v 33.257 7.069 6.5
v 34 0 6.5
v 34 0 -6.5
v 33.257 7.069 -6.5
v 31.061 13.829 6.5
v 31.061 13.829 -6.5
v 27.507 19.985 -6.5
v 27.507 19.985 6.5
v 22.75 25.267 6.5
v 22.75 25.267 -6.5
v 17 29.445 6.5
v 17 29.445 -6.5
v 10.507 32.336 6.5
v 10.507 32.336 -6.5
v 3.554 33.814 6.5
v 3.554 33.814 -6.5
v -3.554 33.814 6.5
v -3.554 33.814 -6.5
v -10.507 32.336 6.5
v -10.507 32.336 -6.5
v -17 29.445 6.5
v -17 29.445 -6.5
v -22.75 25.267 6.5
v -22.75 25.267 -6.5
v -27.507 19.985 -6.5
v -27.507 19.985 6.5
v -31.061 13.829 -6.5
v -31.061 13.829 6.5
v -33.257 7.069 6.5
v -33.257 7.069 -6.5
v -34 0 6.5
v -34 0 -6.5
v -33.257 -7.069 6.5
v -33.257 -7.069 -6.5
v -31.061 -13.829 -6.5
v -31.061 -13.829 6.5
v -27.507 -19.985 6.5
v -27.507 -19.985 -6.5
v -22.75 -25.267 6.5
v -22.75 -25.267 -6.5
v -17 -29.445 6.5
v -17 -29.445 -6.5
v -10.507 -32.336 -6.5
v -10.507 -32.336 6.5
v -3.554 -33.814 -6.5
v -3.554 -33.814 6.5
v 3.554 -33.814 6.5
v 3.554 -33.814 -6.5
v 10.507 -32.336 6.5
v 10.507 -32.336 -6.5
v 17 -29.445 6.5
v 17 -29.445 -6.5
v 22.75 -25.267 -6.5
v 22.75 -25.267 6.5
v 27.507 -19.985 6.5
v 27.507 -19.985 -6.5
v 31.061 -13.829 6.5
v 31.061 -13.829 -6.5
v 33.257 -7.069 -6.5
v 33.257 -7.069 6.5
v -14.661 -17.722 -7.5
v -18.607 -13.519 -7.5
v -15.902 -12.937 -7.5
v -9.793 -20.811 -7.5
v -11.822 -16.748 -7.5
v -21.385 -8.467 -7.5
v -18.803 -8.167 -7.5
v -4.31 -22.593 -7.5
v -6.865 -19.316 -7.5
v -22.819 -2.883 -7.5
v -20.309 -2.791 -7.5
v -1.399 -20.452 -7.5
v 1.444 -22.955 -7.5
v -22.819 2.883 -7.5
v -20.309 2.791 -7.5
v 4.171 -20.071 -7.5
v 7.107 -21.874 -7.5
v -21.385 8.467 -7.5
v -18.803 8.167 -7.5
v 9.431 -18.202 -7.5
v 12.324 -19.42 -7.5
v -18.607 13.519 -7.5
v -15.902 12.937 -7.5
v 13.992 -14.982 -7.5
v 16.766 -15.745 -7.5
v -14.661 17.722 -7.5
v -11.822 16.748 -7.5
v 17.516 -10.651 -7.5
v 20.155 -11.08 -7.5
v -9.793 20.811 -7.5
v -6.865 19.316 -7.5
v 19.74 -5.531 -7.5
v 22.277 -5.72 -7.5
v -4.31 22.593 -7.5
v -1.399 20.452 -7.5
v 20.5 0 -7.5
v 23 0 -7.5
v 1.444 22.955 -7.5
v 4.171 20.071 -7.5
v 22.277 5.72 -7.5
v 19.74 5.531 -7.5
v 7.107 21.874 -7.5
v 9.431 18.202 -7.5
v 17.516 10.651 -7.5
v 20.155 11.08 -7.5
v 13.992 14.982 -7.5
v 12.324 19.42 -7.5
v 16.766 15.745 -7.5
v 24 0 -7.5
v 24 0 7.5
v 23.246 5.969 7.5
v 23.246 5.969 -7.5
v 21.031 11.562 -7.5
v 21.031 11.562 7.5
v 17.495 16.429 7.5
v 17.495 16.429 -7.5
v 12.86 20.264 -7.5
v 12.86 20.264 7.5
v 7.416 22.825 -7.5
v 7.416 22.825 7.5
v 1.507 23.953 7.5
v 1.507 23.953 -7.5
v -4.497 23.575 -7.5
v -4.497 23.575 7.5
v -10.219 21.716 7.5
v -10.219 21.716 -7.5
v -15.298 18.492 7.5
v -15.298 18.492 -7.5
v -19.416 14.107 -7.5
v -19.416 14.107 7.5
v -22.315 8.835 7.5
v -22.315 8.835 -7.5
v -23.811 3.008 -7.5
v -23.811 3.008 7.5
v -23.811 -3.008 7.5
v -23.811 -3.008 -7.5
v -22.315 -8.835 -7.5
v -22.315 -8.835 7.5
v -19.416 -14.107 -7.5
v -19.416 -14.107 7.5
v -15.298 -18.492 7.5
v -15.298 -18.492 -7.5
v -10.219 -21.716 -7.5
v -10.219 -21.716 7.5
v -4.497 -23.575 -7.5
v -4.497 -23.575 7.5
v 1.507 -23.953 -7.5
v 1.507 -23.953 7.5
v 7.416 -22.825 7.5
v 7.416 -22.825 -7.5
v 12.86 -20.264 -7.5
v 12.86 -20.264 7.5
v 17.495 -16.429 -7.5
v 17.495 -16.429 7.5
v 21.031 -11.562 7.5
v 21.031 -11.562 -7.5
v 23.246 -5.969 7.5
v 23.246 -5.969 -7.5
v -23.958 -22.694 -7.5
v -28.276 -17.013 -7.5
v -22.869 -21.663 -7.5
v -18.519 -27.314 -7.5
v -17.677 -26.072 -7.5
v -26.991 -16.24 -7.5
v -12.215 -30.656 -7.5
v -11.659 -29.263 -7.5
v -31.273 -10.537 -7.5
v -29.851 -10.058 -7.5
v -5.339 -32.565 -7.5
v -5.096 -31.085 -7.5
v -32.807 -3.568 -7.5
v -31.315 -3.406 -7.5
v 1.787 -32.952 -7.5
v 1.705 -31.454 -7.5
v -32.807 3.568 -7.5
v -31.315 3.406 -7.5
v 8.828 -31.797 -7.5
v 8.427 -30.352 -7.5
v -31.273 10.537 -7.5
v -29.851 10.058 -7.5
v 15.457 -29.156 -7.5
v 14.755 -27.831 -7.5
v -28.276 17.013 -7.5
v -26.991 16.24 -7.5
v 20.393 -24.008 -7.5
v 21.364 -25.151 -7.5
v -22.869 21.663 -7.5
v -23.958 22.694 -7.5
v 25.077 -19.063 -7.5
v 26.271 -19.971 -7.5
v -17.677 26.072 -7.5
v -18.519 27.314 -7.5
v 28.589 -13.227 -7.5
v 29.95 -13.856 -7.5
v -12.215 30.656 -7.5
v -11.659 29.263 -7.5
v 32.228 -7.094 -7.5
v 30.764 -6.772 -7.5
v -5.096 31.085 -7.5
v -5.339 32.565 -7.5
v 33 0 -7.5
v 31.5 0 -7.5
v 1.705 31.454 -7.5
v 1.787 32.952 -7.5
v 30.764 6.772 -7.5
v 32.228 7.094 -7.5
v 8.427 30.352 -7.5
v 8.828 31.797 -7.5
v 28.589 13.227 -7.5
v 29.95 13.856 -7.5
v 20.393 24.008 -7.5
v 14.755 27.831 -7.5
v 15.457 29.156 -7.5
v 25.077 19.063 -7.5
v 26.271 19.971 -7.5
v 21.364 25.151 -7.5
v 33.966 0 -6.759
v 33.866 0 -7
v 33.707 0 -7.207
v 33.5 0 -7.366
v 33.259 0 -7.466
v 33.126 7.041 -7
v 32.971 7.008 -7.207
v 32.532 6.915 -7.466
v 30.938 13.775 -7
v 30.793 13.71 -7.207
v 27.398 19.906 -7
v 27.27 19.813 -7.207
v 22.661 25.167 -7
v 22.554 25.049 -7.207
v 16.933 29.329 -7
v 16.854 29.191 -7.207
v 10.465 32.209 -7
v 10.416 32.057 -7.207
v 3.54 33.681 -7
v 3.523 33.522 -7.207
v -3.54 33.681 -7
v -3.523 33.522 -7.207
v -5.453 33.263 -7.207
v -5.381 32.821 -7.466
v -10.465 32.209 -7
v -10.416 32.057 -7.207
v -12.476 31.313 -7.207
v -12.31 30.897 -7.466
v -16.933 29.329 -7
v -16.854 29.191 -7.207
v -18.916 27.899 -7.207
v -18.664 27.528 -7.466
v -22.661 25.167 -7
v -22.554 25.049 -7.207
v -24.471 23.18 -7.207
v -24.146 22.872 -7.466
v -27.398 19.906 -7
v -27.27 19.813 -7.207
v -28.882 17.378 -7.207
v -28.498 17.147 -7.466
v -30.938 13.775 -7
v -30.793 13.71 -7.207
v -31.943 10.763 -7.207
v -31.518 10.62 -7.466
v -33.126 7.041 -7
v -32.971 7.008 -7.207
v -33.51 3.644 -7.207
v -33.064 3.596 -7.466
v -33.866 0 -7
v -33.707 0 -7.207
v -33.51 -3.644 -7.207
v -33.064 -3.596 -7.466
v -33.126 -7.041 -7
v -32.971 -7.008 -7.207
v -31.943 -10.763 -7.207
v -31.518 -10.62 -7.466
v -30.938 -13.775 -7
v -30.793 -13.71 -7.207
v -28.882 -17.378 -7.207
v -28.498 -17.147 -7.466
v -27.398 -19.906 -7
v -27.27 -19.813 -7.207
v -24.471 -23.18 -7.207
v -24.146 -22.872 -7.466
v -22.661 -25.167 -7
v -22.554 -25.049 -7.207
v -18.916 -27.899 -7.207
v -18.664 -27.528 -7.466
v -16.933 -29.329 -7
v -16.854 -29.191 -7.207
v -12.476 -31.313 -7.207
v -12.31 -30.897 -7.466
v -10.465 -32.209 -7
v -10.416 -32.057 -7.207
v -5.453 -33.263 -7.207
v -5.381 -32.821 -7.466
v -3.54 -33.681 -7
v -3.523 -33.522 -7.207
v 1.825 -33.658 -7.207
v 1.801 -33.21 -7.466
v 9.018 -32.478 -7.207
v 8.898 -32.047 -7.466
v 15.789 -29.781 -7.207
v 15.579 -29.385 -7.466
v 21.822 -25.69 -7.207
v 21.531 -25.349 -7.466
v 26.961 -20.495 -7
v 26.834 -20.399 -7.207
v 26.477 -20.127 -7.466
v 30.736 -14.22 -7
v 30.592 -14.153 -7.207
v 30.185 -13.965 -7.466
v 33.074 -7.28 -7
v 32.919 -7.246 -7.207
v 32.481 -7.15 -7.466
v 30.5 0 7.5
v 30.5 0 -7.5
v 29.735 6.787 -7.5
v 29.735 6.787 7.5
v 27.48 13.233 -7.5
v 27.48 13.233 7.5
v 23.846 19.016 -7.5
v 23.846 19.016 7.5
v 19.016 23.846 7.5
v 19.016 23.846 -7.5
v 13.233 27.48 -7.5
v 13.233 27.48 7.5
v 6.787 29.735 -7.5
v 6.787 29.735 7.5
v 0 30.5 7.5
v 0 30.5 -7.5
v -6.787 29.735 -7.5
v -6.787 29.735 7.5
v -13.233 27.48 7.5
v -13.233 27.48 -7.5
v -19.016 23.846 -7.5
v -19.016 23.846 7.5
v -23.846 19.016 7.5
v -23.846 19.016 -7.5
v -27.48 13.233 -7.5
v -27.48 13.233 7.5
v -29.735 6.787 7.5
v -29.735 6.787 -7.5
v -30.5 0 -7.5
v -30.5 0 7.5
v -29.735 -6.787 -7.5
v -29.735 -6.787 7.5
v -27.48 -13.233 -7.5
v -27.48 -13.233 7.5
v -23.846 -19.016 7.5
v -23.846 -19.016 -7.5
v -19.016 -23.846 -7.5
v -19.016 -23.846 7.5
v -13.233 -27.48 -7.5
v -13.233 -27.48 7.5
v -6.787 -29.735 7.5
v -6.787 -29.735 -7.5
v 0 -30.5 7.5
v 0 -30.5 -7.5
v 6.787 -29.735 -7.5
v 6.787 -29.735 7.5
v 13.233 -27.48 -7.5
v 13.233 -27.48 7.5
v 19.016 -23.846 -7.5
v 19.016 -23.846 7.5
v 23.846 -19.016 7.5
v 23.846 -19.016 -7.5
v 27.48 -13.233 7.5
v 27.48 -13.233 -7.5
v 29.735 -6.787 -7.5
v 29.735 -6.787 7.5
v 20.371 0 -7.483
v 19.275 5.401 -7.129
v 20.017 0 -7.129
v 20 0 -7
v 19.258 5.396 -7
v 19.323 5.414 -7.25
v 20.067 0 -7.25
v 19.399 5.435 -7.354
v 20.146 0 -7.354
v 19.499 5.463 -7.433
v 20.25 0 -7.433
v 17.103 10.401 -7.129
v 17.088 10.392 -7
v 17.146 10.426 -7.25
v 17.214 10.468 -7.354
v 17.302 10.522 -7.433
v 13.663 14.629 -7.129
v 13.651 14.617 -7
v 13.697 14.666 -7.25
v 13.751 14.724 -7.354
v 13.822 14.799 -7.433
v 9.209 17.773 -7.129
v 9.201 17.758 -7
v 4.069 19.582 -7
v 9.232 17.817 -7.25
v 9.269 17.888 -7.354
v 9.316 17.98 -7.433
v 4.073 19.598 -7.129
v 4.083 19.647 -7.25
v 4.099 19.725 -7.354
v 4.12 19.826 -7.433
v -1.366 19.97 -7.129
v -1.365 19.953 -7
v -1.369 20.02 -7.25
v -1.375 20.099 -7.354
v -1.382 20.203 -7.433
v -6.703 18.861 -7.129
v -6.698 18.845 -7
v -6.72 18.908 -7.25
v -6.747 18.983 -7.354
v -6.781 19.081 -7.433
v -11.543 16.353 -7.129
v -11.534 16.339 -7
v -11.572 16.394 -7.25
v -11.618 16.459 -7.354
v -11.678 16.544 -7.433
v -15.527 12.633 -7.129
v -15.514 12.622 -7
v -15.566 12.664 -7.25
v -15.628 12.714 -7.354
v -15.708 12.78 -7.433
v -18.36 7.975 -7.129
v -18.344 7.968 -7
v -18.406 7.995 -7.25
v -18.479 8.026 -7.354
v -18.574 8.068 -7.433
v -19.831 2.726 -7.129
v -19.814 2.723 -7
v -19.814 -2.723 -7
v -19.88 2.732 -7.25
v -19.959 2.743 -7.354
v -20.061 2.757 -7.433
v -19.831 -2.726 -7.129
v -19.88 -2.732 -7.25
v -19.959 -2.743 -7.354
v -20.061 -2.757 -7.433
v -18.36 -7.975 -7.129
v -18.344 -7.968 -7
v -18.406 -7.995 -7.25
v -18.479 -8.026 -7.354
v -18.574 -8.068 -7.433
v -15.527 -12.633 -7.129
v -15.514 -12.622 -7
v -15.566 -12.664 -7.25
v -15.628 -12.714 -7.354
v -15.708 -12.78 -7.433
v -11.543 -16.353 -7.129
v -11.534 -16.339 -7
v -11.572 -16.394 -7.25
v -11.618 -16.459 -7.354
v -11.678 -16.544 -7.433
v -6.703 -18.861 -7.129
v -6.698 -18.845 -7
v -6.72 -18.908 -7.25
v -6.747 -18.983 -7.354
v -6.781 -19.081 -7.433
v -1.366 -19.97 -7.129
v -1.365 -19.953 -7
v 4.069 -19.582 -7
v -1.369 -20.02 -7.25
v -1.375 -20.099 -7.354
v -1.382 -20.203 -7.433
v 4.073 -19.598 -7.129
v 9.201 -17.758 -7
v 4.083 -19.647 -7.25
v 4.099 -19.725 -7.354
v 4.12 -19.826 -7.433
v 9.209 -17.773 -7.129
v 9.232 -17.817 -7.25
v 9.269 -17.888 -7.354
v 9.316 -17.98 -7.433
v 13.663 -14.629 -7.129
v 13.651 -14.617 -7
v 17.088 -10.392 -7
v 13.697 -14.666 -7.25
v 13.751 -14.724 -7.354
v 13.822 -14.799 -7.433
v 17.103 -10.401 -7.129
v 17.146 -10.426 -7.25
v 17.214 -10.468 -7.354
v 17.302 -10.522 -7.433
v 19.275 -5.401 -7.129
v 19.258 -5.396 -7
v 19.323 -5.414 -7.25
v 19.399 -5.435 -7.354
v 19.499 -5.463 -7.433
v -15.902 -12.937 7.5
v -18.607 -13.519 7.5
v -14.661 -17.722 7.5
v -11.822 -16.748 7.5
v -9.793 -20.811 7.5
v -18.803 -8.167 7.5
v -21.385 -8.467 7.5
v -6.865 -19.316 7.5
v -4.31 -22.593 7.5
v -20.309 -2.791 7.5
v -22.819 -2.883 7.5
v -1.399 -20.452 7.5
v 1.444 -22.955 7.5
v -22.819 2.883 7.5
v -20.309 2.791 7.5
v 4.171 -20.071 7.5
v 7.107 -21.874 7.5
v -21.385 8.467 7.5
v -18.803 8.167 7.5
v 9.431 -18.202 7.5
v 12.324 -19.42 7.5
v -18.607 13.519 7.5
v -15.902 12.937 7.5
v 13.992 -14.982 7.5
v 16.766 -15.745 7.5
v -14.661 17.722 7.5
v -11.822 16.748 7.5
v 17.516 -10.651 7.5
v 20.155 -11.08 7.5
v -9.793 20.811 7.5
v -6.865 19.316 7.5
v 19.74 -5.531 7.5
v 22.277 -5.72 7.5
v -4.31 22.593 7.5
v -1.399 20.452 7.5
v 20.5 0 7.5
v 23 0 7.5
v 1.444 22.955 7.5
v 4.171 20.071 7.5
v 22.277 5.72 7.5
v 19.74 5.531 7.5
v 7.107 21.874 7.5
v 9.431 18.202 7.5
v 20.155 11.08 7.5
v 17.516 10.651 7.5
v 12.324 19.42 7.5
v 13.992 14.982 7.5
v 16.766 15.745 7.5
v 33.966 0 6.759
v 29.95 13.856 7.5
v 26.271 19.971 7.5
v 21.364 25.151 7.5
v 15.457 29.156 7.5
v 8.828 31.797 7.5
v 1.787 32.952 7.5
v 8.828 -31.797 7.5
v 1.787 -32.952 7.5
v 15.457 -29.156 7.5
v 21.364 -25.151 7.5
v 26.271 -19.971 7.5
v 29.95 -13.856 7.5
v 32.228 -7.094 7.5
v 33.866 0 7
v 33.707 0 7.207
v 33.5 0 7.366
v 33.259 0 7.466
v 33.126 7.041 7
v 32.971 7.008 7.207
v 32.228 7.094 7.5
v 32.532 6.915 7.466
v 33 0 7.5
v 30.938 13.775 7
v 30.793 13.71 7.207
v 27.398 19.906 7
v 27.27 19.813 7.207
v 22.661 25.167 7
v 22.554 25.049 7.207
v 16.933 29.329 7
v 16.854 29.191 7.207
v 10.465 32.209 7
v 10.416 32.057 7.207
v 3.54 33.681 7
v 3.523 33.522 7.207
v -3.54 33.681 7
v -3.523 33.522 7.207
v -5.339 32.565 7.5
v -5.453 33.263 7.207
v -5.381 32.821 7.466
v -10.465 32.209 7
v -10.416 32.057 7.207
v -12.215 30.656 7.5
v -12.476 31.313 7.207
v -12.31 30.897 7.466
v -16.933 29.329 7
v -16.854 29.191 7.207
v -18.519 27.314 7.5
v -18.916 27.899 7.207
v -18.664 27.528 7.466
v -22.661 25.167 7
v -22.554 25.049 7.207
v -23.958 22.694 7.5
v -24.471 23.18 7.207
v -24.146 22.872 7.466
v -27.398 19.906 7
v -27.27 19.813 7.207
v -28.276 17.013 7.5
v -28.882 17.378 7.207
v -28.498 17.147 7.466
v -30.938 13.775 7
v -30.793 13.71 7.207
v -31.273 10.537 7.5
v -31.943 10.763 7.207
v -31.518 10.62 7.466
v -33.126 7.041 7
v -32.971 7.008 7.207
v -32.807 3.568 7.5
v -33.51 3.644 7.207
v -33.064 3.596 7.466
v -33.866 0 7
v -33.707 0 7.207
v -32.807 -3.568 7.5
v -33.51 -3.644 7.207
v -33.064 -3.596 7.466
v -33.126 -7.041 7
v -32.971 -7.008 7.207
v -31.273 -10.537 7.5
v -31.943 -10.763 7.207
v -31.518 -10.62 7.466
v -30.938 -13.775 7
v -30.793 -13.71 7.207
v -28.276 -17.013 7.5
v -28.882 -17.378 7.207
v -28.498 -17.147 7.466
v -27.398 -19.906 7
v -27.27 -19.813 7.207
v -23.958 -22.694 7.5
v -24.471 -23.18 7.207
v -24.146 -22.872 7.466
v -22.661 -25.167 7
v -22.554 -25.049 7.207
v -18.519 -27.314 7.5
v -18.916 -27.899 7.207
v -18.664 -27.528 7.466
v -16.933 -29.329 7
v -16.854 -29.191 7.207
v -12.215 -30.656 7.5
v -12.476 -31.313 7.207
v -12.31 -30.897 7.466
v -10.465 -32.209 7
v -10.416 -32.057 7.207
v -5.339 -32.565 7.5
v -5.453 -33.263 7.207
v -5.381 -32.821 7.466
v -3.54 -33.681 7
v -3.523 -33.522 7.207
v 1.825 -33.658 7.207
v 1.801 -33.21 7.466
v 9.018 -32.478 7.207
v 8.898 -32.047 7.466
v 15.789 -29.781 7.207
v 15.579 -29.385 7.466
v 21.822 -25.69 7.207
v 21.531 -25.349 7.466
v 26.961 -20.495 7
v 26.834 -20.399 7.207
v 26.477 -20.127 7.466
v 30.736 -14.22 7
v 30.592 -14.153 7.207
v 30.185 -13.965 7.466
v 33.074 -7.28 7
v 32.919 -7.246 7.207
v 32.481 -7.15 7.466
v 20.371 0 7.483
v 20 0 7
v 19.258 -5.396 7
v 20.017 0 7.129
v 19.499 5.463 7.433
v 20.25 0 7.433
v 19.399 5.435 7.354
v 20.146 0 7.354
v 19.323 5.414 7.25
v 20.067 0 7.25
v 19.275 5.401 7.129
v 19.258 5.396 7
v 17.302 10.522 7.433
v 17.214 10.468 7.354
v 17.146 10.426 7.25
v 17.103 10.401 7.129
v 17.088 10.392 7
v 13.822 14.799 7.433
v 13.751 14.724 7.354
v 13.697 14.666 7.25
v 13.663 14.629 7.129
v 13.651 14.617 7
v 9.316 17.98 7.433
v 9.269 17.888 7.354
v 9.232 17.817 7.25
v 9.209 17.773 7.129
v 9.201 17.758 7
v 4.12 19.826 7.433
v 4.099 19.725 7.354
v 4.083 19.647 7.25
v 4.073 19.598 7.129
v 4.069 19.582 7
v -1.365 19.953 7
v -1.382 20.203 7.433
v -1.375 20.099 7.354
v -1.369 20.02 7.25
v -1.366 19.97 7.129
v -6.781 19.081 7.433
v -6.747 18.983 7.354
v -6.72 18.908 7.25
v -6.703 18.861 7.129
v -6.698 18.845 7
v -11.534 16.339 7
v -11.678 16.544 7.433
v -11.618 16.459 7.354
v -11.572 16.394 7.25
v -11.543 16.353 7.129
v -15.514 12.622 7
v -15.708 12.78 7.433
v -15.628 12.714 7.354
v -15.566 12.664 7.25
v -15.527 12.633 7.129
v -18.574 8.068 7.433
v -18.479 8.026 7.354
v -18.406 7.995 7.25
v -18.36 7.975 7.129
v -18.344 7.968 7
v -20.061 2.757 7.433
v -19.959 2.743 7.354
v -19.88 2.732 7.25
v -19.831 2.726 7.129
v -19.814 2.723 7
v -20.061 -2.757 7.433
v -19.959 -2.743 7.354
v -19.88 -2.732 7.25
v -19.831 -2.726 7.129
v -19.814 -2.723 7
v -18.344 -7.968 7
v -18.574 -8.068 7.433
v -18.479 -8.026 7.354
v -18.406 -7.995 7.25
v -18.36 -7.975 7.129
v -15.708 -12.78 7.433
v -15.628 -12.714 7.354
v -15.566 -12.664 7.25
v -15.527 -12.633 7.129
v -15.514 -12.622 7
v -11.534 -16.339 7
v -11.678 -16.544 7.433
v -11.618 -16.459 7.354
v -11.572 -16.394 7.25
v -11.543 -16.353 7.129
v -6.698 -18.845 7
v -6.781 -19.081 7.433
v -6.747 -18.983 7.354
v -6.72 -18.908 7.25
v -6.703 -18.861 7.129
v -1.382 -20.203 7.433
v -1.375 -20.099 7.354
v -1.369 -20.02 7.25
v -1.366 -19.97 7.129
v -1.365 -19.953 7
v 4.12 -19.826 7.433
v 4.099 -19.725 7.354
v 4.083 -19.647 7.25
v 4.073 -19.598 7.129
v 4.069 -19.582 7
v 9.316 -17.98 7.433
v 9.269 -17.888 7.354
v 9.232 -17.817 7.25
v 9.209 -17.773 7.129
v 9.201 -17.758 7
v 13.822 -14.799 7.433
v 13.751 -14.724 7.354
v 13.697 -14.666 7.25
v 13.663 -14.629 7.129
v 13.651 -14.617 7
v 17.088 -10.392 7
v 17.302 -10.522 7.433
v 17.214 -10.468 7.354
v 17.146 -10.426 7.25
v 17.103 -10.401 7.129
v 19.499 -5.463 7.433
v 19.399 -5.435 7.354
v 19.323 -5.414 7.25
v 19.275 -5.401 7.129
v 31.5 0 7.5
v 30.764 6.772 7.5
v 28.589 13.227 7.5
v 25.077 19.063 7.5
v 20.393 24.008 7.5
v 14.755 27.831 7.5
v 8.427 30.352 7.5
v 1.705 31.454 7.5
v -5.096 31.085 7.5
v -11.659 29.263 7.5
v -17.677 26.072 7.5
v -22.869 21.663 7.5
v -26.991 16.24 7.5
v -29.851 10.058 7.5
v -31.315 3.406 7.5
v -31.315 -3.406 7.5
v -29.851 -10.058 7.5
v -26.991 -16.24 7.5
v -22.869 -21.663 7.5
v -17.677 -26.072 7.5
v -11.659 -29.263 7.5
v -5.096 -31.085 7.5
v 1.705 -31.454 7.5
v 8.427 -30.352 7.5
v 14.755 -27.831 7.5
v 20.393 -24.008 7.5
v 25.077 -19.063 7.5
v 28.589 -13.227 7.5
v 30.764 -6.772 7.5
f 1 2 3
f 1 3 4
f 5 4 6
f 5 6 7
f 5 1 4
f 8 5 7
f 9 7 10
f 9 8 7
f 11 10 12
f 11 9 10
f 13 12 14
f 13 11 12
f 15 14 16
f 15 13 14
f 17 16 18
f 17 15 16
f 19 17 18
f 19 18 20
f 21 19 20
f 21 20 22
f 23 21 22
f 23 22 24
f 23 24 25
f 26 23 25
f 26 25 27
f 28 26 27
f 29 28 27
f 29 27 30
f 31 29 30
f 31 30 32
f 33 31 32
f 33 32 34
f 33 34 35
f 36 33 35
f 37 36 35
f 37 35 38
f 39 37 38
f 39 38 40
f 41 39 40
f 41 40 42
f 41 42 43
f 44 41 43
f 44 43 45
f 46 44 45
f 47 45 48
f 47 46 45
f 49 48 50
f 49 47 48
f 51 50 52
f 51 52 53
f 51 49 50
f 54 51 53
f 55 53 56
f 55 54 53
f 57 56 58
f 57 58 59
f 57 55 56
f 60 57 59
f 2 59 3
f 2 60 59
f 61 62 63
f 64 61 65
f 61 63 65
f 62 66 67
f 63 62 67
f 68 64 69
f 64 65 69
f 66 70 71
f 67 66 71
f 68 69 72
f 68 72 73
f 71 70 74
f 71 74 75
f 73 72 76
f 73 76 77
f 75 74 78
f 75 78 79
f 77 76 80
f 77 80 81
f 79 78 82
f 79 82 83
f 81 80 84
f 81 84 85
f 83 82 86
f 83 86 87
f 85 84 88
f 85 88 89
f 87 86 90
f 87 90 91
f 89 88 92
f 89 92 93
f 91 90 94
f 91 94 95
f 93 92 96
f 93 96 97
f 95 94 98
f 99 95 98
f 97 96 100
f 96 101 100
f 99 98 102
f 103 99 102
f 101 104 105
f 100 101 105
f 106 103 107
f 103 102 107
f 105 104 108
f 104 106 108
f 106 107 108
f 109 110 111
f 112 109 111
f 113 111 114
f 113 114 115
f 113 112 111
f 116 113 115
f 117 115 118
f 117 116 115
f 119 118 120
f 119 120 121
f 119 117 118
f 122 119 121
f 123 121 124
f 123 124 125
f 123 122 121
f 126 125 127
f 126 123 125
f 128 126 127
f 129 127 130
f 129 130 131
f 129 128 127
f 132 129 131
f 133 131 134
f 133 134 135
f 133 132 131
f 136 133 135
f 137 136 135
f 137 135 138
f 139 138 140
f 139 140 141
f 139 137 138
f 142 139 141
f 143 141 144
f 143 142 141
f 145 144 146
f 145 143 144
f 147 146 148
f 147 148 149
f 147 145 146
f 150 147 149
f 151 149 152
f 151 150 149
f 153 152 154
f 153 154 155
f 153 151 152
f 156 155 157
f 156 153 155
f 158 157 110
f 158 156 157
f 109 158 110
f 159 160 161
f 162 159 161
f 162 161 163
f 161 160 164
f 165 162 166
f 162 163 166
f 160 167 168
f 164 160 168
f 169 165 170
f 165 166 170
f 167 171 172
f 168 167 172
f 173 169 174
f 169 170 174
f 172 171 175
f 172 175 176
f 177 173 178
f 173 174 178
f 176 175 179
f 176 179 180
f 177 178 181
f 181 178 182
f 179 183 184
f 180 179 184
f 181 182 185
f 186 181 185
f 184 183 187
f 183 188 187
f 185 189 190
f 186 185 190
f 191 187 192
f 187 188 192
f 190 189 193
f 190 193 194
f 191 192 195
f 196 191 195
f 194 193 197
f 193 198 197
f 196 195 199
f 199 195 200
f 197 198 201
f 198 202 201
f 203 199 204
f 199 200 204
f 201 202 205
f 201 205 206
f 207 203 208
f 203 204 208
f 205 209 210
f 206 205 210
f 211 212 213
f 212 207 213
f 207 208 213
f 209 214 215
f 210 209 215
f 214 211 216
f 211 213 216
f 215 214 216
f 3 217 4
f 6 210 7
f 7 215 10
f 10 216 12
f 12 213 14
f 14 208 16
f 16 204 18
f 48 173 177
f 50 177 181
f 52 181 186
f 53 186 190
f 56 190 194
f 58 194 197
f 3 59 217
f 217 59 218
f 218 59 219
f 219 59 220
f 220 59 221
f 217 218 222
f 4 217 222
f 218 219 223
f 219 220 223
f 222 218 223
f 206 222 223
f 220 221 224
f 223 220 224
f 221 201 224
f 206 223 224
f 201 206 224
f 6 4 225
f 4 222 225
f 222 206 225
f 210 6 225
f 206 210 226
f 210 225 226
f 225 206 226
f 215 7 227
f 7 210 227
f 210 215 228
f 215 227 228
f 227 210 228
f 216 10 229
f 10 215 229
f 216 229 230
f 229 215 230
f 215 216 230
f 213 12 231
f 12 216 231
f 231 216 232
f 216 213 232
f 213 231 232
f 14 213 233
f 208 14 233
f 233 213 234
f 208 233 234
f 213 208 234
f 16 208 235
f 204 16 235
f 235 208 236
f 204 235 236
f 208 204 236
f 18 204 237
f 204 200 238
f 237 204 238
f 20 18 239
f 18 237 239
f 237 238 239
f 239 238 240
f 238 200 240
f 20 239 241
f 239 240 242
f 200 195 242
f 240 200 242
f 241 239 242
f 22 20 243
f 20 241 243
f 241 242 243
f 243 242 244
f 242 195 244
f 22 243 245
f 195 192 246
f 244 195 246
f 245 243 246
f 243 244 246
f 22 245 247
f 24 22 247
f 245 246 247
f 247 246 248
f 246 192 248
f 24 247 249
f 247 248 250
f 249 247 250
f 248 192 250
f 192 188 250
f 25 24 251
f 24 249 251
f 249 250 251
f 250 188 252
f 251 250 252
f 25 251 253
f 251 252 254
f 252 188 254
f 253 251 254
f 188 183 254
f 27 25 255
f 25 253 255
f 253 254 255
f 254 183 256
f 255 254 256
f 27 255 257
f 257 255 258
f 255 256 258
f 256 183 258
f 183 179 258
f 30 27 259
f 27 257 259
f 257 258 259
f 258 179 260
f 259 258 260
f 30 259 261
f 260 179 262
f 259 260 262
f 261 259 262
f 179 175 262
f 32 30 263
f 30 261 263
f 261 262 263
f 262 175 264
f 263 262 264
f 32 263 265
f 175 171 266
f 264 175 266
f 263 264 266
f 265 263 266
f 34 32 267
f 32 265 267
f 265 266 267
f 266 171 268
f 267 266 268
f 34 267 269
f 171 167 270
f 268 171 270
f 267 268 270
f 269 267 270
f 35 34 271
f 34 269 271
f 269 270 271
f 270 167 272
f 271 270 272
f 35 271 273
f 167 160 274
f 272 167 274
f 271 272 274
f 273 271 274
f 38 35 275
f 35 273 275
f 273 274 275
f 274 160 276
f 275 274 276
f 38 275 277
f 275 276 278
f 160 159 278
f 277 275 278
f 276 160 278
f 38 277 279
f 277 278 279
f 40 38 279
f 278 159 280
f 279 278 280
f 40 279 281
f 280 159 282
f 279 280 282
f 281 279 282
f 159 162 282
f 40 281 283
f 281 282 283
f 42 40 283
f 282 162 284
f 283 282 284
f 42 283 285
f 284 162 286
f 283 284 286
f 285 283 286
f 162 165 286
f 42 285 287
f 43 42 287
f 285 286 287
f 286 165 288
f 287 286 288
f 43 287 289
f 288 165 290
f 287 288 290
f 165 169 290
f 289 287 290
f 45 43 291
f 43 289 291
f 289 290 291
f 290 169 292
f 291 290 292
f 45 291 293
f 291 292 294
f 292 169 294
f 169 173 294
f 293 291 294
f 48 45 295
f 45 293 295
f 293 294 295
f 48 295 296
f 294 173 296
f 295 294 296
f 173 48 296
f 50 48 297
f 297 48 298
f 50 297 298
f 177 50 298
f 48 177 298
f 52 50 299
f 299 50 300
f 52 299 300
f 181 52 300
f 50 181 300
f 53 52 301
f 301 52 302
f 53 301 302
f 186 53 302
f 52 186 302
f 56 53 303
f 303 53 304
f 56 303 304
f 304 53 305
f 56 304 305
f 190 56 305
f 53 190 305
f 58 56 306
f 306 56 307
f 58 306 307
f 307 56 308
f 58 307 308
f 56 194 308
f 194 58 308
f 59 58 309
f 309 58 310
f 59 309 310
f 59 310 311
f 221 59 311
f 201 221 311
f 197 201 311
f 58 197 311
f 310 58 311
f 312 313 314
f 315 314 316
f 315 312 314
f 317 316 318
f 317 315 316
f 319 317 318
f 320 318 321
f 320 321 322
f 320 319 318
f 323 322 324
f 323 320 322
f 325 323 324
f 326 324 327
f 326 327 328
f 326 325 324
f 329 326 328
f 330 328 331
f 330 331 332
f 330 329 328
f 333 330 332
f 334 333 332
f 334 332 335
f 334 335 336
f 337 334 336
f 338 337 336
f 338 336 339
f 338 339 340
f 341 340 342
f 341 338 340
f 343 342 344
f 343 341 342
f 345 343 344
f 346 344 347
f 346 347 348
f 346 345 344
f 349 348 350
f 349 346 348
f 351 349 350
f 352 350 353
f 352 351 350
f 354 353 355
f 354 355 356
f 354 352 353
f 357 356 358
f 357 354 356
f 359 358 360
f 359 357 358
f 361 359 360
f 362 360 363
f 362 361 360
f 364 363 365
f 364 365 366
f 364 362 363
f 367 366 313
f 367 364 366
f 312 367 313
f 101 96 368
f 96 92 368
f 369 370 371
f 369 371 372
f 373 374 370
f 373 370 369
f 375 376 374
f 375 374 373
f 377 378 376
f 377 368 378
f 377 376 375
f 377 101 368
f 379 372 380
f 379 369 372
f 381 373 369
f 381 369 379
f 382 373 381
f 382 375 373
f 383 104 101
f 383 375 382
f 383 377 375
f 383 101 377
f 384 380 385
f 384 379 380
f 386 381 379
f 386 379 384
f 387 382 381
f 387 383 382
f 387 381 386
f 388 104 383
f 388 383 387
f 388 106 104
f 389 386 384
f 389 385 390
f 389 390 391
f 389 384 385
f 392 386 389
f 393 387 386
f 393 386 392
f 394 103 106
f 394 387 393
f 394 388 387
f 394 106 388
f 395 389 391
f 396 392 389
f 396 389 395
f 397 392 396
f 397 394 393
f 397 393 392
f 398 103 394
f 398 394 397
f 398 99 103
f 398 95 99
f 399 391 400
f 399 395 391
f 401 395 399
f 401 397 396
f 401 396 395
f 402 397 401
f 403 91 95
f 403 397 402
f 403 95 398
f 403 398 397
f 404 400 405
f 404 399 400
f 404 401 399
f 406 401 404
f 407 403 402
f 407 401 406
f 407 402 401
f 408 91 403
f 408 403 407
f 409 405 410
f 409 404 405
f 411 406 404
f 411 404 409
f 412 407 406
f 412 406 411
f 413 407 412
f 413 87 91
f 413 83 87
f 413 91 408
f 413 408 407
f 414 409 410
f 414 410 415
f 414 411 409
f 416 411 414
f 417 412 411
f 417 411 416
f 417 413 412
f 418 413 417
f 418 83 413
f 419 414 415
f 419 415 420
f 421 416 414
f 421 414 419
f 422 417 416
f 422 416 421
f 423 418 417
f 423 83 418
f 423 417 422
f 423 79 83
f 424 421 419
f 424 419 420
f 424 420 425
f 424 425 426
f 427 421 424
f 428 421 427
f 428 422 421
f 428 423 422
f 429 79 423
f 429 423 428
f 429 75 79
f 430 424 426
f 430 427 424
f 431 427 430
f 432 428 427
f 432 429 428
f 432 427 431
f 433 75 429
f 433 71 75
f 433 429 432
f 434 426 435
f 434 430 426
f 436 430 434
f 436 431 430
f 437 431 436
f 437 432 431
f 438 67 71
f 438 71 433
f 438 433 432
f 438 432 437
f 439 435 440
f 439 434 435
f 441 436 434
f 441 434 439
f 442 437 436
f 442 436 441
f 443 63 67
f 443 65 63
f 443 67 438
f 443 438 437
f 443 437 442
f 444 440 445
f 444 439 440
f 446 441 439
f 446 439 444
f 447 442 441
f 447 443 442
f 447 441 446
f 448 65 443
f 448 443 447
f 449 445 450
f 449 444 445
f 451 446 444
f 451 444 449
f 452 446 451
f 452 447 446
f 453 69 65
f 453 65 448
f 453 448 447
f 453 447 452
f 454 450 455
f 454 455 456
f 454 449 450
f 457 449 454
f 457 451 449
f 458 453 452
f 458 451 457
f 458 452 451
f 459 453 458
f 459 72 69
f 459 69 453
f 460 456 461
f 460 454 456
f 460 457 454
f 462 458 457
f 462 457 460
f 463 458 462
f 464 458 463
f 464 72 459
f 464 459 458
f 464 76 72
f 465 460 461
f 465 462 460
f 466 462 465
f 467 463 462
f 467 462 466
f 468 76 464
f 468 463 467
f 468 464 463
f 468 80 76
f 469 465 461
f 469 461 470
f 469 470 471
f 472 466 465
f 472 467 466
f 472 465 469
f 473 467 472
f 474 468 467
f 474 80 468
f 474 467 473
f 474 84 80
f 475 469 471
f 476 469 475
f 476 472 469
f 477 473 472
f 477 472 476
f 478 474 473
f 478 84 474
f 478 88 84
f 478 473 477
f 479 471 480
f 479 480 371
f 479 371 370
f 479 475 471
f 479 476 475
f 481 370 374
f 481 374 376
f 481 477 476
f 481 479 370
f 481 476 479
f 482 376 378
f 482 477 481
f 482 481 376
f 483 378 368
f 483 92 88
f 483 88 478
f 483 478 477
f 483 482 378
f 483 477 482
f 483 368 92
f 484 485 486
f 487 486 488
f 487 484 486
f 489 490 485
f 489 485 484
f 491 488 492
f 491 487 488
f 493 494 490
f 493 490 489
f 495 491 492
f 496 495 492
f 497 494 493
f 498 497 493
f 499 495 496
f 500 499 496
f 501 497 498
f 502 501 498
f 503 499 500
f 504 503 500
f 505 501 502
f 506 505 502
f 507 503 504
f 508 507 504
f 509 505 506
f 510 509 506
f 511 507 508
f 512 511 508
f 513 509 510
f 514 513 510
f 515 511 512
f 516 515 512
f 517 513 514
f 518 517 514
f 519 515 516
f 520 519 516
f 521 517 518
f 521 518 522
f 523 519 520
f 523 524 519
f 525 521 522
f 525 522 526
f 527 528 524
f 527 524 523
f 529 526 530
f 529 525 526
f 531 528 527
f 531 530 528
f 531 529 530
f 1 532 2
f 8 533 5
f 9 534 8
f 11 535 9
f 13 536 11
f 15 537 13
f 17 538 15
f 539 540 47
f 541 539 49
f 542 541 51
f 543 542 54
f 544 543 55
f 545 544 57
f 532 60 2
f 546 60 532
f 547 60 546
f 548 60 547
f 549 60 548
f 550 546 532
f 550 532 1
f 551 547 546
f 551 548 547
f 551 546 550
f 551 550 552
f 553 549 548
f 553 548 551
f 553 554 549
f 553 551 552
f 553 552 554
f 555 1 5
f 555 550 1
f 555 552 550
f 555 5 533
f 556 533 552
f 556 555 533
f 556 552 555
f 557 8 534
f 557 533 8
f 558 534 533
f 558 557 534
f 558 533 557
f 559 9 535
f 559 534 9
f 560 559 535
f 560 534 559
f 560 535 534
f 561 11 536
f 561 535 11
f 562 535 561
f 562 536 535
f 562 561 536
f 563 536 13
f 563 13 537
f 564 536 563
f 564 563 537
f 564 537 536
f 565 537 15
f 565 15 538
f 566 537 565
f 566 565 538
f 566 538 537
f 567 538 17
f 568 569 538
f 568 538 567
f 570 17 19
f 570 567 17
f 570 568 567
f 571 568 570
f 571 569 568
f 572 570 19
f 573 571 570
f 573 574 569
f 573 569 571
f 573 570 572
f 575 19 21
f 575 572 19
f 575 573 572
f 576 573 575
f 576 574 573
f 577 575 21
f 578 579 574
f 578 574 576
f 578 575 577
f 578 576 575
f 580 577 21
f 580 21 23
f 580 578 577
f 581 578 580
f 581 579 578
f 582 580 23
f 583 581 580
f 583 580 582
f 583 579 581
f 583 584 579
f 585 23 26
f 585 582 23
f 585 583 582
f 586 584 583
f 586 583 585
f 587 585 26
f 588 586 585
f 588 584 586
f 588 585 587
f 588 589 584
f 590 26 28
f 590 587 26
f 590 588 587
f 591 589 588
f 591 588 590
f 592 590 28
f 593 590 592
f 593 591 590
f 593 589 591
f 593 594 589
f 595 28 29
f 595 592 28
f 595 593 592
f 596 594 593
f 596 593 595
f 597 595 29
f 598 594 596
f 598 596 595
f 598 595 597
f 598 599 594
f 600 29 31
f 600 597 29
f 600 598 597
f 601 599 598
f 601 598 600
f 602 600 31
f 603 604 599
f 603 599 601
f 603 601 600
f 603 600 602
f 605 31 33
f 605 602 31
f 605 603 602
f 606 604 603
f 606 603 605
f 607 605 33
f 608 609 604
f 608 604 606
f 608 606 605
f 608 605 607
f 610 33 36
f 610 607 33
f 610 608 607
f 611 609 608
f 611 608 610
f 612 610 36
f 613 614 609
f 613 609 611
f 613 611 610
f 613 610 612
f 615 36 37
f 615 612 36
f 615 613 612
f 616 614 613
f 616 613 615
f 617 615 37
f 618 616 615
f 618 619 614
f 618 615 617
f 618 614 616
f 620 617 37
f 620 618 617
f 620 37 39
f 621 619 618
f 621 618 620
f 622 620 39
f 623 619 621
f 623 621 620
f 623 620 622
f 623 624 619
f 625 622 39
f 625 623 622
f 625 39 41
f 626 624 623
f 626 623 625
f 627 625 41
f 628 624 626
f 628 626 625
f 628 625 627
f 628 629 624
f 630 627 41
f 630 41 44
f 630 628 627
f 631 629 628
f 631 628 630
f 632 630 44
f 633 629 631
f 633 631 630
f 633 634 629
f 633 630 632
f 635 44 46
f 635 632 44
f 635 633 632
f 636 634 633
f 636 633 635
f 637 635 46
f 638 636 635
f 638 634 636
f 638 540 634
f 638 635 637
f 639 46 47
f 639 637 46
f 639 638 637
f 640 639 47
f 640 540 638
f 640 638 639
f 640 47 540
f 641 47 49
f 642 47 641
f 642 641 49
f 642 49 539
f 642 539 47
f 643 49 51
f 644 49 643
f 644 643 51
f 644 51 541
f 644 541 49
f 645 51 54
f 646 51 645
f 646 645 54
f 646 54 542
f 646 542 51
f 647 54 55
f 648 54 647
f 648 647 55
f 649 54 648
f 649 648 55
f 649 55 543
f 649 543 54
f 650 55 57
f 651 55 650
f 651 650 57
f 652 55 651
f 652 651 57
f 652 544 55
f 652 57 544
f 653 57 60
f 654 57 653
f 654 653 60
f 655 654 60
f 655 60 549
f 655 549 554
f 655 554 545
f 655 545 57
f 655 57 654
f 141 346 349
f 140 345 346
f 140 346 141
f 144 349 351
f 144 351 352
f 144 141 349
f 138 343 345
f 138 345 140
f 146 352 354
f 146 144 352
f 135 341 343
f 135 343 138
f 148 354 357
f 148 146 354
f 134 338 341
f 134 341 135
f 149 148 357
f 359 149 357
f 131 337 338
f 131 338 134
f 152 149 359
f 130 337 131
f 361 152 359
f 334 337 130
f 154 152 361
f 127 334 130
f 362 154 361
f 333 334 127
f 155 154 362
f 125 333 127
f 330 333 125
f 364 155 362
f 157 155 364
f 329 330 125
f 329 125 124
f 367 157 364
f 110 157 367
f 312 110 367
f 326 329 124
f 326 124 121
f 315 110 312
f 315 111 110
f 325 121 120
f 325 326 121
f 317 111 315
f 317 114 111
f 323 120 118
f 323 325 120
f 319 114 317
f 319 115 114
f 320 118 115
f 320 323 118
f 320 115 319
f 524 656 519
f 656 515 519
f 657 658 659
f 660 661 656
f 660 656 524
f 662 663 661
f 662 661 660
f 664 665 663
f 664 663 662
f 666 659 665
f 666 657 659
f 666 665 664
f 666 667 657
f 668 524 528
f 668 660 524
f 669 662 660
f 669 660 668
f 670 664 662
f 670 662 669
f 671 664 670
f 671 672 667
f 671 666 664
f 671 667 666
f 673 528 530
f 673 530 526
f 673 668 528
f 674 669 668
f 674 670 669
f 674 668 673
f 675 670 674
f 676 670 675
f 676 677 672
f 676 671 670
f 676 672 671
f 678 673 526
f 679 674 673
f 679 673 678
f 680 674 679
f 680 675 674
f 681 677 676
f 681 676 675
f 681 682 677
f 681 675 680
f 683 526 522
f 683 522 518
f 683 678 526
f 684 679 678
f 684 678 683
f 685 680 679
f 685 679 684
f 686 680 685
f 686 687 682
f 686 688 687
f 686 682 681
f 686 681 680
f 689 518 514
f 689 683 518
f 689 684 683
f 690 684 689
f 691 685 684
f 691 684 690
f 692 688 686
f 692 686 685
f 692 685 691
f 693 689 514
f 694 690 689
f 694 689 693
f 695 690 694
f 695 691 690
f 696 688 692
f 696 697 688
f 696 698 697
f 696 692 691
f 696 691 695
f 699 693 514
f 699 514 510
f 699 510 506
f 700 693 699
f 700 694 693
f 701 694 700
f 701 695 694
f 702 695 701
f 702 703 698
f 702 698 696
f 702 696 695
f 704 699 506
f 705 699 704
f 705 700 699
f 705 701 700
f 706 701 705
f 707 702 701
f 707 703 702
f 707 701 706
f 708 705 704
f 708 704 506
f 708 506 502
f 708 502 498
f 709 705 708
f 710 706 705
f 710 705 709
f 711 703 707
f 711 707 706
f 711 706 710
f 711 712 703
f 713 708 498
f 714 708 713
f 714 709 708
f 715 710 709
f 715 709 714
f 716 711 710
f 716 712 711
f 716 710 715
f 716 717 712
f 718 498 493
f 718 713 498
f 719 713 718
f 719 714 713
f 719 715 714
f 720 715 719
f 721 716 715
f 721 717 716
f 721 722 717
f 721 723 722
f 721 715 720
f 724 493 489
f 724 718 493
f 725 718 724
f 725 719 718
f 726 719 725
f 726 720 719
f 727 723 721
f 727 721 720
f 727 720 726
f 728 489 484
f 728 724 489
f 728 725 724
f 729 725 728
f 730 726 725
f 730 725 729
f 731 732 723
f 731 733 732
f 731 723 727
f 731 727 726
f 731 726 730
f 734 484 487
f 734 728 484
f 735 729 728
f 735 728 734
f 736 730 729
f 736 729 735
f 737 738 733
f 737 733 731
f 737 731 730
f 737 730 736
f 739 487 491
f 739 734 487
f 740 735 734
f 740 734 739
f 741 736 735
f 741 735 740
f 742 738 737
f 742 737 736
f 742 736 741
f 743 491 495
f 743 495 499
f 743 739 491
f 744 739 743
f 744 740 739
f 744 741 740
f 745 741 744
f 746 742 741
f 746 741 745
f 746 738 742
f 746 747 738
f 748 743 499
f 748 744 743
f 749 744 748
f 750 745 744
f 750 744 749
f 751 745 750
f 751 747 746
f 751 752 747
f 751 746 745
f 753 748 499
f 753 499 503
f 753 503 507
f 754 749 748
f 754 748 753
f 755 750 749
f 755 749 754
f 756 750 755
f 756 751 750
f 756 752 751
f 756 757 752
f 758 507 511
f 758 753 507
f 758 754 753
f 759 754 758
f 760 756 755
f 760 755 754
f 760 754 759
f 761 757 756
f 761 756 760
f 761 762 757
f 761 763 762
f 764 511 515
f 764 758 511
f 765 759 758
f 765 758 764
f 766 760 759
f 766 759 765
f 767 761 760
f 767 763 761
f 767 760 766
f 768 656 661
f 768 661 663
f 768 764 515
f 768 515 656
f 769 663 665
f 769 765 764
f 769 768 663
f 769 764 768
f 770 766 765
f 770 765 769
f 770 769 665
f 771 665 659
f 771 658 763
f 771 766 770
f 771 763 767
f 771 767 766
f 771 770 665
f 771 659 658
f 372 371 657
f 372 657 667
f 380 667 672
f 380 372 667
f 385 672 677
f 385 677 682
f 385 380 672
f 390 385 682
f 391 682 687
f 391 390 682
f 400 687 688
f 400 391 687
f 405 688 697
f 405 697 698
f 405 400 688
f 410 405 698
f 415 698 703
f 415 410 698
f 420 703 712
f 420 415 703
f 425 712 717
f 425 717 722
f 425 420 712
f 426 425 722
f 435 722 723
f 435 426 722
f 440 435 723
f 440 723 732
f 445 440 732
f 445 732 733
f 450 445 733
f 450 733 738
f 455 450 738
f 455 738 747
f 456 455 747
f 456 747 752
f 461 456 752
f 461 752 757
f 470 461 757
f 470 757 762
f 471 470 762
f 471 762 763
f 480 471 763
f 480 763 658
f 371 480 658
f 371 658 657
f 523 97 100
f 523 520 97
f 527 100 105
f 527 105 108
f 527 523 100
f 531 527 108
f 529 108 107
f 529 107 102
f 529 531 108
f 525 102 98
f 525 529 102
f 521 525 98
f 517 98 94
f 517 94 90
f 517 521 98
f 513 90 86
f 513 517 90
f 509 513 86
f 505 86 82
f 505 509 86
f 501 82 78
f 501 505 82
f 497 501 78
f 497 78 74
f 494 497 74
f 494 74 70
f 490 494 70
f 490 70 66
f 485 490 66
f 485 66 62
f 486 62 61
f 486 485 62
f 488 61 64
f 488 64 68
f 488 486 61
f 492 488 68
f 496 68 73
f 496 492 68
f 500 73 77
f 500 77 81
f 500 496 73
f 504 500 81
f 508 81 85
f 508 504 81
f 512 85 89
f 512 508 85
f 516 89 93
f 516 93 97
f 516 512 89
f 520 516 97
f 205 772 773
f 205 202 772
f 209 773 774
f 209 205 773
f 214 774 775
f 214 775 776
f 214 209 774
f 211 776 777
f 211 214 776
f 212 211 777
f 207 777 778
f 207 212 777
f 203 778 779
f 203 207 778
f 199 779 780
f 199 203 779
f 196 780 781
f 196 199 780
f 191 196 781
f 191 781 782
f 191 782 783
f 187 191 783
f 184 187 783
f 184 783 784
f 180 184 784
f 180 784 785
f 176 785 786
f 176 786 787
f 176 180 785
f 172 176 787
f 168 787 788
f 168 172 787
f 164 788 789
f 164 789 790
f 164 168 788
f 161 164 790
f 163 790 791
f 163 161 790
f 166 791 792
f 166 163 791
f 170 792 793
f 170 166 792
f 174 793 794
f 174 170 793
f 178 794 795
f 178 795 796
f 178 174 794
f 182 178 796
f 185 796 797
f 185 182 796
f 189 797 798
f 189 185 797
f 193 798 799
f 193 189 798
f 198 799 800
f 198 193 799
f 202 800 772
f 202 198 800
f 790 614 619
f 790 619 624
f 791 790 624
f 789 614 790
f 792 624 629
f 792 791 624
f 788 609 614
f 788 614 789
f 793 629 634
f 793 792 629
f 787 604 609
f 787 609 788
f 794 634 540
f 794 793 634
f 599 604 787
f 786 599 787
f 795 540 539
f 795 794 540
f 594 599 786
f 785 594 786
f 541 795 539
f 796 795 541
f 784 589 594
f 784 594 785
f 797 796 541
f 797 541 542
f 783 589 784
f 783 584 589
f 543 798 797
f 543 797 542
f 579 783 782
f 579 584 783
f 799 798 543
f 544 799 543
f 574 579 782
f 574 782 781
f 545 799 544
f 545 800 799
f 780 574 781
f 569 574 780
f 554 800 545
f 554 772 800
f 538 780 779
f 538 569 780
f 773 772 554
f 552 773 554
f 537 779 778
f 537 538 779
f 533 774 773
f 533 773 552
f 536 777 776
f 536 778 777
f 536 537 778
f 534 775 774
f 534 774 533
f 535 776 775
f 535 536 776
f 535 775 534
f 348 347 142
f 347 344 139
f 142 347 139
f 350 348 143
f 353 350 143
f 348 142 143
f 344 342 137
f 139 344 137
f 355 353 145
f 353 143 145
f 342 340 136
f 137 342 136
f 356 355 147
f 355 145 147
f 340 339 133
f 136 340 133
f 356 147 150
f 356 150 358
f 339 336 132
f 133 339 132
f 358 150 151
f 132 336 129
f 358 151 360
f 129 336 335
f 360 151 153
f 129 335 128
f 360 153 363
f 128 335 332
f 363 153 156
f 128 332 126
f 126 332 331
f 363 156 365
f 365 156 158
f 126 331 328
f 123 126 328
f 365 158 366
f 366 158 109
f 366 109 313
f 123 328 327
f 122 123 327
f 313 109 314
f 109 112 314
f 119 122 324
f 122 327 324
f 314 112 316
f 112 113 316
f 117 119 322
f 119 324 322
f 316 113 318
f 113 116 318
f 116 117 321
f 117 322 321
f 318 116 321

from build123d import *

# Parameters (mm, degrees)
CROQUIS1_R                = 23
CROQUIS1_R_2              = 20
SALIENTE_EXTRUIR1_DEPTH   = 7.5
CROQUIS1_R_3              = 30.5
CROQUIS1_R_4              = 24
SALIENTE_EXTRUIR1_2_DEPTH = 7.5
CROQUIS1_R_5              = 34
CROQUIS1_R_6              = 31.5
SALIENTE_EXTRUIR1_3_DEPTH = 7.5
REDONDEO1_R               = 1
REDONDEO2_R               = 0.5


with BuildPart() as part:
    # Croquis1 → Saliente-Extruir1 (new, symmetric)
    with BuildSketch(Plane.XY):
        Circle(CROQUIS1_R)
        Circle(CROQUIS1_R_2, mode=Mode.SUBTRACT)
    extrude(amount=SALIENTE_EXTRUIR1_DEPTH, both=True)

    # Redondeo2
    redondeo2_edges = [part.edges().sort_by_distance(p)[0] for p in [
        (-20, 0, -7.5),
        (-20, 0, 7.5),
    ]]
    fillet(redondeo2_edges, radius=REDONDEO2_R)


with BuildPart() as body_2:
    # Croquis1 → Saliente-Extruir1 2 (new, symmetric)
    with BuildSketch(Plane.XY):
        Circle(CROQUIS1_R_3)
        Circle(CROQUIS1_R_4, mode=Mode.SUBTRACT)
    extrude(amount=SALIENTE_EXTRUIR1_2_DEPTH, both=True)


with BuildPart() as body_3:
    # Croquis1 → Saliente-Extruir1 3 (new, symmetric)
    with BuildSketch(Plane.XY):
        Circle(CROQUIS1_R_5)
        Circle(CROQUIS1_R_6, mode=Mode.SUBTRACT)
    extrude(amount=SALIENTE_EXTRUIR1_3_DEPTH, both=True)

    # Redondeo1
    redondeo1_edges = [body_3.edges().sort_by_distance(p)[0] for p in [
        (-34, 0, -7.5),
        (-34, 0, 7.5),
    ]]
    fillet(redondeo1_edges, radius=REDONDEO1_R)


solid = Compound([part.part, body_2.part, body_3.part])
